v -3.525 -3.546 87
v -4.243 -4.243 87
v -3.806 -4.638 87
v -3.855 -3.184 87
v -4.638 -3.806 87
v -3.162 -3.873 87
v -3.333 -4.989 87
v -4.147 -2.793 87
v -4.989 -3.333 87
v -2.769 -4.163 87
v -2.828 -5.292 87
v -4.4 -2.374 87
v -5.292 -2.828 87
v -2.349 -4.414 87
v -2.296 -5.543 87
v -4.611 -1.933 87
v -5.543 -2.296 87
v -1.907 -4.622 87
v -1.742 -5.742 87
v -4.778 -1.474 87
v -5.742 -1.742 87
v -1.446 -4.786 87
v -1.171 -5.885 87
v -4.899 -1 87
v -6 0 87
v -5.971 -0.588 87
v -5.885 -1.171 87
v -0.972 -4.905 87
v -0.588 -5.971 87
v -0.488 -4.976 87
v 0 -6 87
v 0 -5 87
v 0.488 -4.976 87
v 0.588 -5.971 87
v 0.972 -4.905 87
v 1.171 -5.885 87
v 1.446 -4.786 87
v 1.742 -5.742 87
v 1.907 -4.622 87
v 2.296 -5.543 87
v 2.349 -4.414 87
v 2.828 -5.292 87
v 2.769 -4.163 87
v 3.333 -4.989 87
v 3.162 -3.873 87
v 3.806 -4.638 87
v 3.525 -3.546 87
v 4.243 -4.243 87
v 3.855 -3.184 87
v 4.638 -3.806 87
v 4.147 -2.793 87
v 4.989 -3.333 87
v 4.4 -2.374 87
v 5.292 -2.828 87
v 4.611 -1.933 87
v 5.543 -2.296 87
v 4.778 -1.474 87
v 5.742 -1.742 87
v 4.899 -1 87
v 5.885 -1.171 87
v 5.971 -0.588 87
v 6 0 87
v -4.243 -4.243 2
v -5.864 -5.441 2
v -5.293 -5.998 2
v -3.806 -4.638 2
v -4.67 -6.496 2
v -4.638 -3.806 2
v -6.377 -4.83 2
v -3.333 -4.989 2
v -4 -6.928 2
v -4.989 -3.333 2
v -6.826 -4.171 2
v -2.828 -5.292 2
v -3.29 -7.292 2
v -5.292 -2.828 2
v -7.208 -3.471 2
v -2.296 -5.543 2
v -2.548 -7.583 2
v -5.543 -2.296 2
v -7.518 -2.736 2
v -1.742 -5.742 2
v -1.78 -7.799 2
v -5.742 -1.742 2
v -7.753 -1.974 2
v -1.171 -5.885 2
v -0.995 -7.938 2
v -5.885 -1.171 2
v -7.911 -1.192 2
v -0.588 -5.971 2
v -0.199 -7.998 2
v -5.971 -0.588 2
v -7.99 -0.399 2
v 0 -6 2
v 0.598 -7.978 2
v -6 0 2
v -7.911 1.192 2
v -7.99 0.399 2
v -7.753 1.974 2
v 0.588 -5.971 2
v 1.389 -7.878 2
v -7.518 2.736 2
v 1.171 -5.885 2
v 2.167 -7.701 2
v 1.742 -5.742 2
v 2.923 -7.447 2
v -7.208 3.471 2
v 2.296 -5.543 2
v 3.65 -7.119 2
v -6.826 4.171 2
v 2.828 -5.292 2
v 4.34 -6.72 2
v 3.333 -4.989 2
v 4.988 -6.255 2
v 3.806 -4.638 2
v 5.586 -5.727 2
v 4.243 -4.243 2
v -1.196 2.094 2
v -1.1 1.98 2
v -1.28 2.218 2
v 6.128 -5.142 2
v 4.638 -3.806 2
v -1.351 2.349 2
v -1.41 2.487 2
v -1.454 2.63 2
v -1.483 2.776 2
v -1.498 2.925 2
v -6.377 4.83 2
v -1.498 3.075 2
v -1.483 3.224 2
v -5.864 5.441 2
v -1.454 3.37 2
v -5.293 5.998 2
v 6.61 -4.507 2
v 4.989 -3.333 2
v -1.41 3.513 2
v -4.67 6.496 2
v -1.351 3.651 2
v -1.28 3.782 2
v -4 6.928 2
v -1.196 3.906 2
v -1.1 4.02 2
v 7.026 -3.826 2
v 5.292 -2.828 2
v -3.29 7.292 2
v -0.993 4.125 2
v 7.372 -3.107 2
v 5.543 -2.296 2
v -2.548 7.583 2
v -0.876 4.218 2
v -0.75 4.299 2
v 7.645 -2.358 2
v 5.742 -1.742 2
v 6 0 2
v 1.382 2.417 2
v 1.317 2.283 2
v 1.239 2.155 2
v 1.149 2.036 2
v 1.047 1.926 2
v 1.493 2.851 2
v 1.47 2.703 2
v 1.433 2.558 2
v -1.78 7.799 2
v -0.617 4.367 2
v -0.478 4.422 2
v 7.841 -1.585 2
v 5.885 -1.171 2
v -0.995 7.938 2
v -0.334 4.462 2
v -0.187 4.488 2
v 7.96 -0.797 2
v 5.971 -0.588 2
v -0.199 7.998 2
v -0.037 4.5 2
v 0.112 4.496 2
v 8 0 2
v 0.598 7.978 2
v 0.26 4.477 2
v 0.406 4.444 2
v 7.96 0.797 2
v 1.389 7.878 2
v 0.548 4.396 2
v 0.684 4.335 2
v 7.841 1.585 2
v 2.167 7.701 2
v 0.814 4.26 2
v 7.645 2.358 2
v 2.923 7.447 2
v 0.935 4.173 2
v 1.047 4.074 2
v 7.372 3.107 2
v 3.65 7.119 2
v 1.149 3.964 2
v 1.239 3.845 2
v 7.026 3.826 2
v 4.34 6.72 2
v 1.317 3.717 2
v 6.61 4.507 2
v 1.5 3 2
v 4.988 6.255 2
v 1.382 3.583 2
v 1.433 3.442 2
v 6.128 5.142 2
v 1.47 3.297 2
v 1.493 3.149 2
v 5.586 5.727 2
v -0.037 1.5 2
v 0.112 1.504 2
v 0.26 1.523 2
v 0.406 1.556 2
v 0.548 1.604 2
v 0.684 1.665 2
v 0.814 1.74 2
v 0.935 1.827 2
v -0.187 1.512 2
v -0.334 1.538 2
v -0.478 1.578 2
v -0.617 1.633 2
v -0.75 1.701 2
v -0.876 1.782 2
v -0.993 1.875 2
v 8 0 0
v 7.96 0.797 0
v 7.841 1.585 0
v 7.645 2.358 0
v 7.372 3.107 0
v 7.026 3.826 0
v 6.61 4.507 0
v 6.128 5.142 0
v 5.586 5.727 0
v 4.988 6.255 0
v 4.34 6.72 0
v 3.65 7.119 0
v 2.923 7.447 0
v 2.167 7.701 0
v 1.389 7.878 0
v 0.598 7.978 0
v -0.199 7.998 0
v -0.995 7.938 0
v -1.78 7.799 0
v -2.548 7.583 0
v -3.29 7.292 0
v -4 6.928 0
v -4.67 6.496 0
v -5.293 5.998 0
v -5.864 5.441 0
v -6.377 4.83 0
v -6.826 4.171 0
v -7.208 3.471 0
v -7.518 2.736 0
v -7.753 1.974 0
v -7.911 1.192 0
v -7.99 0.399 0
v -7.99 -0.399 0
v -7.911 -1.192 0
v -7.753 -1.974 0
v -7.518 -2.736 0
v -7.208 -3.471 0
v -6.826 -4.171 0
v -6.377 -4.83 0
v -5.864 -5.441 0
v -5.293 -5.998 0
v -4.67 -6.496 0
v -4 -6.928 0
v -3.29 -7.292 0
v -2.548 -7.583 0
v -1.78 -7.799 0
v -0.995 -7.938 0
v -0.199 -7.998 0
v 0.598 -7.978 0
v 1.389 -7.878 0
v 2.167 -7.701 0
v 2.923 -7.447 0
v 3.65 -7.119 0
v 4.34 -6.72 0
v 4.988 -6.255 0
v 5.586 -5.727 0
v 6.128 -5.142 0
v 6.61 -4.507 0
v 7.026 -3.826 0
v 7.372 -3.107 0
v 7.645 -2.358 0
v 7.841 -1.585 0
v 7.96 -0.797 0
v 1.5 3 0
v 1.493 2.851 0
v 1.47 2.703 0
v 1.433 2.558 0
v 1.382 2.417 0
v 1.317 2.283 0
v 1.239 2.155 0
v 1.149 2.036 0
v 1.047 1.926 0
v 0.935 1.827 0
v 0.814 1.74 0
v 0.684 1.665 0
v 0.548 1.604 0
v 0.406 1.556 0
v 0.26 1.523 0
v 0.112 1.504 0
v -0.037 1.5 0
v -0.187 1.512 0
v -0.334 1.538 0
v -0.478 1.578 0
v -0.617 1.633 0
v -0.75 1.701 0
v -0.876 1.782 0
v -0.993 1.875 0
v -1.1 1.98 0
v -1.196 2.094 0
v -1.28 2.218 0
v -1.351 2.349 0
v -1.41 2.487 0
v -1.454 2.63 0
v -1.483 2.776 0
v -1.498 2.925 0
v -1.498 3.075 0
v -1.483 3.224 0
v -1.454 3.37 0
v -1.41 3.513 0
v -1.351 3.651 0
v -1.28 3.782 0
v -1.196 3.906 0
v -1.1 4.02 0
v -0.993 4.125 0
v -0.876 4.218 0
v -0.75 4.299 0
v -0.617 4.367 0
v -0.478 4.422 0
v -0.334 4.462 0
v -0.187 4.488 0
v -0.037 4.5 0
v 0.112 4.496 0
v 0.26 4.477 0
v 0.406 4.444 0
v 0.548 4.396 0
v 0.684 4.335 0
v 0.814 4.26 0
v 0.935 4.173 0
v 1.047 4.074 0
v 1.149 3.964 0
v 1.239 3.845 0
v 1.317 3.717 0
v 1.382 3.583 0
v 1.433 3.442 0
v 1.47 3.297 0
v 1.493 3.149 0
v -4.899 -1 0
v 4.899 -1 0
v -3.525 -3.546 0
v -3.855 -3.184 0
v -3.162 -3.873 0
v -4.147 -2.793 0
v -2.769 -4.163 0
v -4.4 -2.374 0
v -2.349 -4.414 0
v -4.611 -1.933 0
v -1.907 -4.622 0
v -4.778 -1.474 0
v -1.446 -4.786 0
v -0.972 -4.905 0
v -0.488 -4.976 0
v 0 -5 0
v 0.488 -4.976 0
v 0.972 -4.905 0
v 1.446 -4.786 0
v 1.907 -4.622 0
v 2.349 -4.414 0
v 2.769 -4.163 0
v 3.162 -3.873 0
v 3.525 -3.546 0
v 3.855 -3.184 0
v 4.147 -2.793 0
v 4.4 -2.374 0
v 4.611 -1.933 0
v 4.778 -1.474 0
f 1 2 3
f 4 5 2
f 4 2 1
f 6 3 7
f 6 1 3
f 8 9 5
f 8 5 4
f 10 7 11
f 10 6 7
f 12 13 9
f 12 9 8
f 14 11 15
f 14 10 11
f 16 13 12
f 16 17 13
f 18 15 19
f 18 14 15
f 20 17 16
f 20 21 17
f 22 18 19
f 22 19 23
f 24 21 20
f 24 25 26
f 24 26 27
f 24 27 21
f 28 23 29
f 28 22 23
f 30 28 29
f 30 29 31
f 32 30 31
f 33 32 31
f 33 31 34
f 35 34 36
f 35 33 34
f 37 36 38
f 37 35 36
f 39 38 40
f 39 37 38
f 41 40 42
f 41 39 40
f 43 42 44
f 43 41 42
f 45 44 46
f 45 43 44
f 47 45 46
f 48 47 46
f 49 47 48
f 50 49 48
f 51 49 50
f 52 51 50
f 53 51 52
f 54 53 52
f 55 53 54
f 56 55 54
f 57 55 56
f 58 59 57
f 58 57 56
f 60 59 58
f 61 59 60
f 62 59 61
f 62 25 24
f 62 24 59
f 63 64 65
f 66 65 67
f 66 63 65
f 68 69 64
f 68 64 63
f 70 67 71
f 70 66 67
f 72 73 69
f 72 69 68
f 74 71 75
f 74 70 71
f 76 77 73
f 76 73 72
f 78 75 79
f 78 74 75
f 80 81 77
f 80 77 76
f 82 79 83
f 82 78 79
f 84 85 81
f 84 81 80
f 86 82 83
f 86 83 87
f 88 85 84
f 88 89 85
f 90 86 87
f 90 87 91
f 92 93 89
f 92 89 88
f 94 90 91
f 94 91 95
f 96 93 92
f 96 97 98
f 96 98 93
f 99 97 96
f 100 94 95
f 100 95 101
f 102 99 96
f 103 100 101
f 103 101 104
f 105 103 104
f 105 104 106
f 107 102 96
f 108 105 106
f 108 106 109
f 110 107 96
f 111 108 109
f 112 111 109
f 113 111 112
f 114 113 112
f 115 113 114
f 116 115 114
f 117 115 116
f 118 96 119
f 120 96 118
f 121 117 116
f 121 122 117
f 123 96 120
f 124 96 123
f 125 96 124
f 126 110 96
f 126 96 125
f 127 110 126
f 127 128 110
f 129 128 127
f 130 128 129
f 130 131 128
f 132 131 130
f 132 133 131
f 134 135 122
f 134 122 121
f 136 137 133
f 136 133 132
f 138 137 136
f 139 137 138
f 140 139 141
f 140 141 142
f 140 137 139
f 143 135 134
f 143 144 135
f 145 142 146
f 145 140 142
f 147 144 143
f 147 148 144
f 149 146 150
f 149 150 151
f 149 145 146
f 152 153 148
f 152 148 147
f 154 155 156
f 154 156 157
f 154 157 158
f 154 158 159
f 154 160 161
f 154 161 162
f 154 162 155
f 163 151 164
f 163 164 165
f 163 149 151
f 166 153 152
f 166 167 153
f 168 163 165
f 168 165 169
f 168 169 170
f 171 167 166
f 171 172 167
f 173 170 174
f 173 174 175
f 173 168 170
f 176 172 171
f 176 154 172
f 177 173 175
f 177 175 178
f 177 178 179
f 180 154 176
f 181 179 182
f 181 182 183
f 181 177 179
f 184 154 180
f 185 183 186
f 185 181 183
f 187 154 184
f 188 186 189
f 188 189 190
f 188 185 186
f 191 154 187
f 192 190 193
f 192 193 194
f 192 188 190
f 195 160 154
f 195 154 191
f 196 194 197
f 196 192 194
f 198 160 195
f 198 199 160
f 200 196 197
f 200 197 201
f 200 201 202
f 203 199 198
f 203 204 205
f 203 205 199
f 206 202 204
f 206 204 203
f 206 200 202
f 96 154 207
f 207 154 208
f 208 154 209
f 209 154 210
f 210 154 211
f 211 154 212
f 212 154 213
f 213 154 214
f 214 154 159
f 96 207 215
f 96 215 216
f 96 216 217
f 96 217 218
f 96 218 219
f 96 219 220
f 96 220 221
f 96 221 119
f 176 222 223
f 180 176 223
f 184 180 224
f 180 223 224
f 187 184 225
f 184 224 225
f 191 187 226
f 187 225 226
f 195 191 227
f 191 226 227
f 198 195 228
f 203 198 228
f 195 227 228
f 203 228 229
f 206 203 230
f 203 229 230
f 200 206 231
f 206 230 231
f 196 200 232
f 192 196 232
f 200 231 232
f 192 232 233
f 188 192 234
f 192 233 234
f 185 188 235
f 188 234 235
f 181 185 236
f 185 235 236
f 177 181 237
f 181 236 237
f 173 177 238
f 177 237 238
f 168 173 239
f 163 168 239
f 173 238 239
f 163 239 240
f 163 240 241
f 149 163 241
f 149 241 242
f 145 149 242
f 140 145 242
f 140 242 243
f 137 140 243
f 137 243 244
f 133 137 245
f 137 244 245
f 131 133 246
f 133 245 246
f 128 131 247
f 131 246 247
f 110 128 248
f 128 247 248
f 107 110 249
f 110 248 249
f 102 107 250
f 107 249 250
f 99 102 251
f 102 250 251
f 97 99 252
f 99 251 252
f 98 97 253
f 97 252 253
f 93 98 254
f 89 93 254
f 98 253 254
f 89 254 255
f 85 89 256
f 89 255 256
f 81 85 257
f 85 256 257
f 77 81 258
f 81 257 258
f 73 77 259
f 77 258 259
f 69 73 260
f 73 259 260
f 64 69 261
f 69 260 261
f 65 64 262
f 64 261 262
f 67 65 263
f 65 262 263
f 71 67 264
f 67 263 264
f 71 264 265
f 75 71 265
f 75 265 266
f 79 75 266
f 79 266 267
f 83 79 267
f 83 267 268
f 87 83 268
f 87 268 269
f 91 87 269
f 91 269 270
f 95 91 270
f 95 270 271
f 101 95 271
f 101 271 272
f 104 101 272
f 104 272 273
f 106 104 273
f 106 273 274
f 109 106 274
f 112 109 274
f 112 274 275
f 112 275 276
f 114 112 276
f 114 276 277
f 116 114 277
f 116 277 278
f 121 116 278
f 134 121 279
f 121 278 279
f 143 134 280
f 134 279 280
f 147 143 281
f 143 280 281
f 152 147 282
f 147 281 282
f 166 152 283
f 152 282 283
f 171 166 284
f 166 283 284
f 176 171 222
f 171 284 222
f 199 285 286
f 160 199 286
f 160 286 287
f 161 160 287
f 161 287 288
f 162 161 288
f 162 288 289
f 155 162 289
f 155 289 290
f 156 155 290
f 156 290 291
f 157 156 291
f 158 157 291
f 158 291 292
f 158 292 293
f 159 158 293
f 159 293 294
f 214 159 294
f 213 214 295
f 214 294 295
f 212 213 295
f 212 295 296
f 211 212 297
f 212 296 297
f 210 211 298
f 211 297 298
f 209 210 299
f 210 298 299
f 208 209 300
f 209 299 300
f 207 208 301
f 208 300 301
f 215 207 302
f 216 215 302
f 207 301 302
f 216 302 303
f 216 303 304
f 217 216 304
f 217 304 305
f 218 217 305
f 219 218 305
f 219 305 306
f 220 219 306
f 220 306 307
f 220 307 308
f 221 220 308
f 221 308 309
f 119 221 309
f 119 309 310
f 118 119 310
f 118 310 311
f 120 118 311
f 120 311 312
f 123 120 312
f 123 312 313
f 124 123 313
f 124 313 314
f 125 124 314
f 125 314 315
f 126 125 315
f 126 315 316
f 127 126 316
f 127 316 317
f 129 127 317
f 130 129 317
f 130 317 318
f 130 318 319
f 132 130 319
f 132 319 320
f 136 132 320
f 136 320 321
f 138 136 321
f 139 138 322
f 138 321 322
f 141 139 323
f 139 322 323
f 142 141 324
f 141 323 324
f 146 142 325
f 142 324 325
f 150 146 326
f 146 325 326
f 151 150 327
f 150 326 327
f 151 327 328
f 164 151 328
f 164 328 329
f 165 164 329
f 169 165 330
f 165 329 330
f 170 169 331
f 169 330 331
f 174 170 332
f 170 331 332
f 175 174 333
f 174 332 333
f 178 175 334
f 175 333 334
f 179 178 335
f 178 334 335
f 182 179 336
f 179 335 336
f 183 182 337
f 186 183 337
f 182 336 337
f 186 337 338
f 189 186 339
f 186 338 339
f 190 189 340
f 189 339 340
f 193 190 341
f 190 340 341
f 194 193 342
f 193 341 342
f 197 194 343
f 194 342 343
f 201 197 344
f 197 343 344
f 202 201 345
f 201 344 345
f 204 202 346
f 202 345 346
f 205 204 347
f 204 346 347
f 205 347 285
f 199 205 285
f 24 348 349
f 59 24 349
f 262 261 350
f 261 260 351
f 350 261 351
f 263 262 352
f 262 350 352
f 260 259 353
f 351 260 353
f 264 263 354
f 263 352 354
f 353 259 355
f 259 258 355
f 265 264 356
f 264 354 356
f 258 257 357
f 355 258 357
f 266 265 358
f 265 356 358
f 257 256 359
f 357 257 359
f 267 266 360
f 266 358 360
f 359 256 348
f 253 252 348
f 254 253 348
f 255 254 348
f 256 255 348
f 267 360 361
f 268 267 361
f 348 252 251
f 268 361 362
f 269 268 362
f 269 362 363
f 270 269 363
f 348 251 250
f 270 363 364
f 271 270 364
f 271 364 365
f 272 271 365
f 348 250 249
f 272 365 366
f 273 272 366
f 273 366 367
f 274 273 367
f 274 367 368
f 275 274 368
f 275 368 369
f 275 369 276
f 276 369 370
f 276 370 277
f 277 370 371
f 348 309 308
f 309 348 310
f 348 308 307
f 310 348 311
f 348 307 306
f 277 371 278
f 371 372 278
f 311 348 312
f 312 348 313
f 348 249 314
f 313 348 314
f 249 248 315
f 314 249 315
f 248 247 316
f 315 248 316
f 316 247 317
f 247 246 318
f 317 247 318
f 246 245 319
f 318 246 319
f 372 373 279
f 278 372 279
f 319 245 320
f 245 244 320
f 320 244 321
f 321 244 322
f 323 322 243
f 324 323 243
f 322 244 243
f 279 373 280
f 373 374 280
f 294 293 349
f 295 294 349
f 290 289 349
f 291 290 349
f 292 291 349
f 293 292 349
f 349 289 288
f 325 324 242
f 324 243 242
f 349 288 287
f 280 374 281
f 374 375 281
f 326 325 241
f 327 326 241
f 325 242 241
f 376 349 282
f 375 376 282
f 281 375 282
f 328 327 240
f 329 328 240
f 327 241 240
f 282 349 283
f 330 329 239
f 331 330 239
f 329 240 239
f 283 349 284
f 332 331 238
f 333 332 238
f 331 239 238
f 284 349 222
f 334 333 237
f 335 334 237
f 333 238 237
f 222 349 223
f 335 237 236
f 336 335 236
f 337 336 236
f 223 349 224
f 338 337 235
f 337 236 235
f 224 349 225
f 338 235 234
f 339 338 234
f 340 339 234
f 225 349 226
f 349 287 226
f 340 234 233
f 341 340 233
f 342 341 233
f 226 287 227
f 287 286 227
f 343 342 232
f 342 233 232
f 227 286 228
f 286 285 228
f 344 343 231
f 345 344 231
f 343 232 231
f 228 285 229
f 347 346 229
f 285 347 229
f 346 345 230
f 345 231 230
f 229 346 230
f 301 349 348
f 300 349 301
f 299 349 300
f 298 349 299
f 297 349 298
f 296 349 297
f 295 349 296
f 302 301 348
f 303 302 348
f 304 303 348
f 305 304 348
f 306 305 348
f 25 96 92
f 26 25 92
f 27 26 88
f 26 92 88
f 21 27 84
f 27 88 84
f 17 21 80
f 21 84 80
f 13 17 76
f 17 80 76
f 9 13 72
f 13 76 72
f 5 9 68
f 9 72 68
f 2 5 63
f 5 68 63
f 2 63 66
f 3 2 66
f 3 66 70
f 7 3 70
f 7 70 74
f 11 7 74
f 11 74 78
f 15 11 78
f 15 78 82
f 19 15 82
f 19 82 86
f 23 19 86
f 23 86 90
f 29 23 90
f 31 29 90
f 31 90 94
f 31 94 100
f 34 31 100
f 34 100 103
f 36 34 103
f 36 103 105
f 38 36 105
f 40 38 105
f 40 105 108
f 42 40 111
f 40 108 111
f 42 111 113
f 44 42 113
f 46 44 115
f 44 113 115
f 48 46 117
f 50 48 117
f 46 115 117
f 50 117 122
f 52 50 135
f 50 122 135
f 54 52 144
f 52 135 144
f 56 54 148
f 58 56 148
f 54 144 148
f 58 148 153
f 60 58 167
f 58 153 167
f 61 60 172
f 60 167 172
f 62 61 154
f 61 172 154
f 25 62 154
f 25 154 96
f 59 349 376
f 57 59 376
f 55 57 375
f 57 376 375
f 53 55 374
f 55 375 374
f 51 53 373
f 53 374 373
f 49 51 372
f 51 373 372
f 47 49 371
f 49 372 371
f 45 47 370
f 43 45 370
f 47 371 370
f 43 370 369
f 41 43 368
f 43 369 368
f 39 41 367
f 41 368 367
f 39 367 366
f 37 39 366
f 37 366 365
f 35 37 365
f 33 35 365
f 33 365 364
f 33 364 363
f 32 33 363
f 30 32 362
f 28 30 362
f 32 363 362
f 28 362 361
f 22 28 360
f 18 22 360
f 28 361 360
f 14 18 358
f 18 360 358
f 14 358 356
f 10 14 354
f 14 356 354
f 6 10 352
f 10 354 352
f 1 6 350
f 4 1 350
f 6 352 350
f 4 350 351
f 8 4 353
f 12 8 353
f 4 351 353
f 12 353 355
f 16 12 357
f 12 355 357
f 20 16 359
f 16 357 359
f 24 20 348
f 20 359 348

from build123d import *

# Parameters (mm, degrees)
F1_DEPTH = 87
F0_R     = 8
F2_DEPTH = 2
F3_R     = 1.5
F4_DEPTH = 25


with BuildPart() as f1:
    # F0 (on Top) → F1 (new body)
    with BuildSketch(Plane.XY):
        with BuildLine():
            Line((6, 0), (-6, 0))
            ThreePointArc((-6, 0), (0, -6), (6, 0))
        make_face()
        with BuildLine():
            ThreePointArc((4.898979, -1), (0, -5), (-4.898979, -1))
            Line((-4.898979, -1), (4.898979, -1))
        make_face(mode=Mode.SUBTRACT)
    extrude(amount=F1_DEPTH)

    # F0 (on Top) → F2 (join)
    with BuildSketch(Plane.XY):
        Circle(F0_R)
        with BuildLine():
            ThreePointArc((6, 0), (0, -6), (-6, 0))
            Line((-6, 0), (6, 0))
        make_face(mode=Mode.SUBTRACT)
    extrude(amount=F2_DEPTH)

    # F3 (on face) → F4 (cut)
    with BuildSketch(Plane(origin=(0, 0, 0), x_dir=(1, 0, 0), z_dir=(0, 0, -1))):
        with Locations((0, -3)):
            Circle(F3_R)
    extrude(amount=-F4_DEPTH, mode=Mode.SUBTRACT)


solid = f1.part
